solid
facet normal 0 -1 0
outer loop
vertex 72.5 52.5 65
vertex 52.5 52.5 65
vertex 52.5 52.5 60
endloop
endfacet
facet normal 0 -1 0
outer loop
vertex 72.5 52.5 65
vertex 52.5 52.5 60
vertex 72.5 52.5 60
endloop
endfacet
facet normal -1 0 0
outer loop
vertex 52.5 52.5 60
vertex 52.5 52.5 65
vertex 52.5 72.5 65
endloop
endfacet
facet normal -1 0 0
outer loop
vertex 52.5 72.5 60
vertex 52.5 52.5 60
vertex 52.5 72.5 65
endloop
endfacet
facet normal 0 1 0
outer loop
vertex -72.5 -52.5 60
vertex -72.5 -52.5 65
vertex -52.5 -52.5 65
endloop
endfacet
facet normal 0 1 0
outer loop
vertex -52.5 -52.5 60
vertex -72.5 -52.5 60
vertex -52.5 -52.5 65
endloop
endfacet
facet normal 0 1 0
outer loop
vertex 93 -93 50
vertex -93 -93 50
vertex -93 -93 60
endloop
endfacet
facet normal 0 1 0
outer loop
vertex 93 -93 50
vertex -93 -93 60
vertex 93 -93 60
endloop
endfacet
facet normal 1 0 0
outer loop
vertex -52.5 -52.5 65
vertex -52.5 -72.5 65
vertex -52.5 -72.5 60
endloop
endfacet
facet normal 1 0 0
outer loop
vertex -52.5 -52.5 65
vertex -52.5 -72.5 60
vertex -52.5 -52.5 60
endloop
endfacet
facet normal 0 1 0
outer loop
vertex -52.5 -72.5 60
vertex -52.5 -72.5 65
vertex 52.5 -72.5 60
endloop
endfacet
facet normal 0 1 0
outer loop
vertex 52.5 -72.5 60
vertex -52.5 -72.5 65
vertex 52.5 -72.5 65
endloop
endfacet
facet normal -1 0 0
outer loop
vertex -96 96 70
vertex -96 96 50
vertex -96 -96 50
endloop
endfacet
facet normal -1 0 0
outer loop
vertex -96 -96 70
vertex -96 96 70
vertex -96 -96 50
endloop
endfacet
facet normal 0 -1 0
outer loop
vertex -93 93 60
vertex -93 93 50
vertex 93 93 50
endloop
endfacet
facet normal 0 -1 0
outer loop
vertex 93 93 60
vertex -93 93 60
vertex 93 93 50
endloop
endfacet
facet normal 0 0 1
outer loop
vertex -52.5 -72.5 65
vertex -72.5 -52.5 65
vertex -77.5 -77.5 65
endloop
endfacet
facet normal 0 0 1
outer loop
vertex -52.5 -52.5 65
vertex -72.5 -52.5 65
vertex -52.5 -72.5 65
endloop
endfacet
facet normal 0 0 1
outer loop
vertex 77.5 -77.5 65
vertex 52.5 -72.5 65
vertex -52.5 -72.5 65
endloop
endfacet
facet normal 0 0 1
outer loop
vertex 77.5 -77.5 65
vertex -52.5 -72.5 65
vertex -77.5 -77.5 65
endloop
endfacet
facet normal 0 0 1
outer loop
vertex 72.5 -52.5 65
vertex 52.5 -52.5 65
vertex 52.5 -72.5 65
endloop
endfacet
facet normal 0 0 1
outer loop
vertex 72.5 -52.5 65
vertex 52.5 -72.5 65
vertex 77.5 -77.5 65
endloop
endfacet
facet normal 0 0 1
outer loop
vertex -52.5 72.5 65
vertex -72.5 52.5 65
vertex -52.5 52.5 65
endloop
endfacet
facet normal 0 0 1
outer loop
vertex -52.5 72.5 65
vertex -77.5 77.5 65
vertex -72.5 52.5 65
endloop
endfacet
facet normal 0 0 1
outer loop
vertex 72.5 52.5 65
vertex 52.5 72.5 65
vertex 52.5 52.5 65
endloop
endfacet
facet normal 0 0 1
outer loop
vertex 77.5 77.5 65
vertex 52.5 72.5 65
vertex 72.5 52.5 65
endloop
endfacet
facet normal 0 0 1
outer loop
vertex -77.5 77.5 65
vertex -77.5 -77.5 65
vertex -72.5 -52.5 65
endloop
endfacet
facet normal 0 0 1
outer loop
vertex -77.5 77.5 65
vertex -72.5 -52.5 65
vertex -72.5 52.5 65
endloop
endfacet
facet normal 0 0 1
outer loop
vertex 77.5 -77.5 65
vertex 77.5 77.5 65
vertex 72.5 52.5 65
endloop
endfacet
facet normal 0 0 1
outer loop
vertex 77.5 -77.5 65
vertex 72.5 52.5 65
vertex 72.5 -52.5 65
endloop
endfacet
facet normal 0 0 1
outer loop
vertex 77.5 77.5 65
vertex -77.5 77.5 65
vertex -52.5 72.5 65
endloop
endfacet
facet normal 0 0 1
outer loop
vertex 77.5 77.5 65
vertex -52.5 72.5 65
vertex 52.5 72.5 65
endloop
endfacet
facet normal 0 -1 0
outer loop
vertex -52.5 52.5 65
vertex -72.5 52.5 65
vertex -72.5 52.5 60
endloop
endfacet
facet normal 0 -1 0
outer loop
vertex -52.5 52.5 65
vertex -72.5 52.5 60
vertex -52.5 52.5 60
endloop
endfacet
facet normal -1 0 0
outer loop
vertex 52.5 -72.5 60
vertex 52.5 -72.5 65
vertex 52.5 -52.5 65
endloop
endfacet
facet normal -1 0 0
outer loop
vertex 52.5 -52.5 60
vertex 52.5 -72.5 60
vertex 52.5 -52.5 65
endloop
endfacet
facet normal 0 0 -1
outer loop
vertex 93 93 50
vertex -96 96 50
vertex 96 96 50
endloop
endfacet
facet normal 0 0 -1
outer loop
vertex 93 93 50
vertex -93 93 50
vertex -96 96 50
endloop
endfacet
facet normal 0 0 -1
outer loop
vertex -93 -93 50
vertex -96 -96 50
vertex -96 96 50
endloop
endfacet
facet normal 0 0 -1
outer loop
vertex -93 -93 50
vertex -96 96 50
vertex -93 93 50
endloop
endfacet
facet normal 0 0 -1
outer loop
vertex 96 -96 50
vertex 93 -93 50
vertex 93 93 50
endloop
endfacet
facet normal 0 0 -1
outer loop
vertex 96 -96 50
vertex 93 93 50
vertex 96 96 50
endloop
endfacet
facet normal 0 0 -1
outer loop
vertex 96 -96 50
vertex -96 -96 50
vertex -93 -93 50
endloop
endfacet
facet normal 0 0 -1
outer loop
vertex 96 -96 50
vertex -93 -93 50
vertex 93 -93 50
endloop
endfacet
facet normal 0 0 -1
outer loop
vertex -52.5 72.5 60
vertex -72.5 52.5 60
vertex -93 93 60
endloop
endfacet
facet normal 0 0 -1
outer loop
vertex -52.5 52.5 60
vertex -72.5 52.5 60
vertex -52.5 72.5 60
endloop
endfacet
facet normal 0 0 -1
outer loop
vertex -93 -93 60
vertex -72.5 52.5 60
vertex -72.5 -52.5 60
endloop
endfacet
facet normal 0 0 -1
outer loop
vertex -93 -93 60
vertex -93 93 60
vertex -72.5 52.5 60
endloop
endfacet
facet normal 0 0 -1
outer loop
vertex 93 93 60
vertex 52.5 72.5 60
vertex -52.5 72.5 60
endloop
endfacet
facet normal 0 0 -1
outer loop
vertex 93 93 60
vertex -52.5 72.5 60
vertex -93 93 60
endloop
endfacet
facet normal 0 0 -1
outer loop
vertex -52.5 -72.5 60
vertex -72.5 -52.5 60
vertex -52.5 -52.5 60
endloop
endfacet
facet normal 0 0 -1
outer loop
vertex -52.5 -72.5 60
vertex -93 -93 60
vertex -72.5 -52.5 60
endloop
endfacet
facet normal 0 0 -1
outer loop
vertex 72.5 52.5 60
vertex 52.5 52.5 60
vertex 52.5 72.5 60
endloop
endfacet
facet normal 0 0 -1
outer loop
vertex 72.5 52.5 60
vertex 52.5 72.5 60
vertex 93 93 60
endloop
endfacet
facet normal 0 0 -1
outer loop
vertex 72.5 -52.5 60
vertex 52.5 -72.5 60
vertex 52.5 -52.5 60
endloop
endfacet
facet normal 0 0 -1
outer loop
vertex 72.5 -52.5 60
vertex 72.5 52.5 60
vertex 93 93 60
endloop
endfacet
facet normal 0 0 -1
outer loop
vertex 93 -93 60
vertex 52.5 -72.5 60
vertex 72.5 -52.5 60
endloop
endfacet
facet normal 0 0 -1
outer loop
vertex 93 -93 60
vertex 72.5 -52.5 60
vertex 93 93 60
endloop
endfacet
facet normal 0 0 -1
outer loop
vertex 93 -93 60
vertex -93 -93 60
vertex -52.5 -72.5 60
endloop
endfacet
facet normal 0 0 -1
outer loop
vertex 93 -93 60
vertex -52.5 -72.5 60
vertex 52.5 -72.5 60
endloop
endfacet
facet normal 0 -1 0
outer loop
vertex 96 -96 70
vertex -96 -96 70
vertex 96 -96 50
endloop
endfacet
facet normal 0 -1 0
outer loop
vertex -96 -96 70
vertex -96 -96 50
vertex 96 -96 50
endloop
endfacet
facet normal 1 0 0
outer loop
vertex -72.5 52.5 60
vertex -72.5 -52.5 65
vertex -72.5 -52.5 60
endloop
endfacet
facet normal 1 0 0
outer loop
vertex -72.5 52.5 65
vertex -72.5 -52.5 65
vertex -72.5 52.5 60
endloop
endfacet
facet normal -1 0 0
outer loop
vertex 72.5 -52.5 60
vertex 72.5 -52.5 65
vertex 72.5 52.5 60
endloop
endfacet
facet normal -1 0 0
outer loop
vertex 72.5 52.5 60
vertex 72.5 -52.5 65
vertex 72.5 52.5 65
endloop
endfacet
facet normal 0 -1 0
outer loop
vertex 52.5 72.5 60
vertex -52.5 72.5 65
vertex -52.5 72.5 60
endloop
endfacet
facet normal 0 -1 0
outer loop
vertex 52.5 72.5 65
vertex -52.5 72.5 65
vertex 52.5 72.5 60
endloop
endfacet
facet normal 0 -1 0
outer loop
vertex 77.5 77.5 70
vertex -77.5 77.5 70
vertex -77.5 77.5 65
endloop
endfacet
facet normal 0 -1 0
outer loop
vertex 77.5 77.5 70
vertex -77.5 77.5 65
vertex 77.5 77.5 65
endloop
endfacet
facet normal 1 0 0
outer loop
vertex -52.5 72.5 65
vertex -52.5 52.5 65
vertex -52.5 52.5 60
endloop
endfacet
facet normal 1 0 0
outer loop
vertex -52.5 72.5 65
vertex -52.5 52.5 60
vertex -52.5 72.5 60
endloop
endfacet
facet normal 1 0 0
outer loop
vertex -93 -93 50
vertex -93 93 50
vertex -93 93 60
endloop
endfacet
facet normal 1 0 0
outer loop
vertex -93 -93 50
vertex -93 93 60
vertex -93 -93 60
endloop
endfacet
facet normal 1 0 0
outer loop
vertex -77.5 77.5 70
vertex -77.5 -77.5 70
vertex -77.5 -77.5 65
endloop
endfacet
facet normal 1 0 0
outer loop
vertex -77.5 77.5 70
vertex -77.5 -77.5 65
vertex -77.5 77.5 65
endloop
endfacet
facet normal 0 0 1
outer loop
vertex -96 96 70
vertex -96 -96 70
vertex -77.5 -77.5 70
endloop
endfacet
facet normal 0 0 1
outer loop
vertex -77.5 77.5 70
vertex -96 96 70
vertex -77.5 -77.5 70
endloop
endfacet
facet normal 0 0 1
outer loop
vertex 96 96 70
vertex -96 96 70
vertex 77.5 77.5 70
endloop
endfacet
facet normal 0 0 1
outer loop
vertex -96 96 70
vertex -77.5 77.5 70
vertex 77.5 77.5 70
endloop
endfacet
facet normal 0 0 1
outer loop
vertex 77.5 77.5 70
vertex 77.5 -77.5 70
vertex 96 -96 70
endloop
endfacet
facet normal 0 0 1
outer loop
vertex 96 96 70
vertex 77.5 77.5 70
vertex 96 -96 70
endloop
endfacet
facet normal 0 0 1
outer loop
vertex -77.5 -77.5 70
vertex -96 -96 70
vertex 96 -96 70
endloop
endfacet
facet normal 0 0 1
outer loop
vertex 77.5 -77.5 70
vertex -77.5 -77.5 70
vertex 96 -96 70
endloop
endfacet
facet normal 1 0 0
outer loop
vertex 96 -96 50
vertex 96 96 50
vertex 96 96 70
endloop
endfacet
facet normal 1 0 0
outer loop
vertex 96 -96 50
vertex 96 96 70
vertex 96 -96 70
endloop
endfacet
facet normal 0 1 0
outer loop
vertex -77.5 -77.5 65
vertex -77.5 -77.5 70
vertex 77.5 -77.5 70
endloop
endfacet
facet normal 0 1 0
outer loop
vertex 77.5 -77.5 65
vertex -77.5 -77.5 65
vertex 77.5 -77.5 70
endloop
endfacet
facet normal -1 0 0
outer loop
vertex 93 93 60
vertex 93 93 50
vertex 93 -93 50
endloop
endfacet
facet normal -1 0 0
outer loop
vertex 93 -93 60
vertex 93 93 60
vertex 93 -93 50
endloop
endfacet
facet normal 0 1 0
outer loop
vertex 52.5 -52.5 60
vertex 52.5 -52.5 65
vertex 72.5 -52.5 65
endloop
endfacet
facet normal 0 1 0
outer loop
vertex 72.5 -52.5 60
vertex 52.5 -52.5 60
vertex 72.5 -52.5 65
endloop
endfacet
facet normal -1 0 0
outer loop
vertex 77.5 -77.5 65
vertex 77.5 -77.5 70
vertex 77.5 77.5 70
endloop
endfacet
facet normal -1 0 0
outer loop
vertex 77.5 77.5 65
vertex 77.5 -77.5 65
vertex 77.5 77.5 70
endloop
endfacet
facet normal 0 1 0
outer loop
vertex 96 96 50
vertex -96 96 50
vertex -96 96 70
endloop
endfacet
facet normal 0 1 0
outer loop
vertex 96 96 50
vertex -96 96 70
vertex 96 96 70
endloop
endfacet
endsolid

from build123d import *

# Parameters (mm, degrees)
F0_W           = 180
F0_H           = 180
F1_DEPTH       = 70
F2_T           = -5
F3_W           = 170
F3_H           = 170
F4_DEPTH       = 10
F5_W           = 155
F5_H           = 155
F6_DEPTH       = 5
F7_W           = 145
F7_H           = 145
F8_DEPTH       = 25
F9_W           = 20
F9_H           = 20
F10_DEPTH      = 5
F11_W          = 236.9226813316
F11_H          = 264.4580230117
F11_W_2        = 180
F11_H_2        = 180
F12_DEPTH      = 25
F13_W          = 243.9718917012
F13_H          = 319.6009546518
F13_W_2        = 180
F13_H_2        = 180
F14_DEPTH      = 55
F14_DEPTH_BACK = 25
F15_W          = 192
F15_H          = 192
F15_W_2        = 180
F15_H_2        = 180
F16_DEPTH      = 10
F16_DEPTH_BACK = 10
F17_DEPTH      = 5
F18_W          = 186
F18_H          = 186
F18_W_2        = 180
F18_H_2        = 180
F19_DEPTH      = 10


with BuildPart() as f1:
    # F0 (on Top) → F1 (new body)
    with BuildSketch(Plane.XY):
        Rectangle(F0_W, F0_H)
    extrude(amount=F1_DEPTH)

    # F2
    f2_openings = [f1.faces().sort_by_distance(p)[0] for p in [
        (0, 0, 70),
    ]]
    offset(amount=F2_T, openings=f2_openings)

    # F3 (on face) → F4 (join)
    with BuildSketch(Plane.XY.offset(70)):
        Rectangle(F3_W, F3_H)
    extrude(amount=-F4_DEPTH)

    # F5 (on face) → F6 (cut)
    with BuildSketch(Plane.XY.offset(70)):
        Rectangle(F5_W, F5_H)
    extrude(amount=-F6_DEPTH, mode=Mode.SUBTRACT)

    # F7 (on face) → F8 (cut)
    with BuildSketch(Plane.XY.offset(65)):
        Rectangle(F7_W, F7_H)
    extrude(amount=-F8_DEPTH, mode=Mode.SUBTRACT)

    # F9 (on face) → F10 (join)
    with BuildSketch(Plane.XY.offset(65)):
        with Locations((-62.5, 62.5)):
            Rectangle(F9_W, F9_H)
        with Locations((62.5, 62.5)):
            Rectangle(F9_W, F9_H)
        with Locations((62.5, -62.5)):
            Rectangle(F9_W, F9_H)
        with Locations((-62.5, -62.5)):
            Rectangle(F9_W, F9_H)
    extrude(amount=-F10_DEPTH)

    # F11 (on face) → F12 (cut)
    with BuildSketch(Plane(origin=(0, 0, 0), x_dir=(1, 0, 0), z_dir=(0, 0, -1))):
        with Locations((12.1972411871, 16.292501241)):
            Rectangle(F11_W, F11_H)
        Rectangle(F11_W_2, F11_H_2, mode=Mode.SUBTRACT)
    extrude(amount=-F12_DEPTH, mode=Mode.SUBTRACT)

    # F13 (on face) → F14 (cut, two sides)
    with BuildSketch(Plane(origin=(0, 0, 0), x_dir=(1, 0, 0), z_dir=(0, 0, -1))) as f14_sk:
        with Locations((-22.6087830961, -21.1053714156)):
            Rectangle(F13_W, F13_H)
        Rectangle(F13_W_2, F13_H_2, mode=Mode.SUBTRACT)
        Rectangle(F13_W_2, F13_H_2)
    extrude(amount=-F14_DEPTH, mode=Mode.SUBTRACT)
    extrude(f14_sk.sketch, amount=F14_DEPTH_BACK, mode=Mode.SUBTRACT)

    # F15 (on face) → F16 (join, two sides)
    with BuildSketch(Plane(origin=(0, 0, 60), x_dir=(1, 0, 0), z_dir=(0, 0, -1))) as f16_sk:
        Rectangle(F15_W, F15_H)
        Rectangle(F15_W_2, F15_H_2, mode=Mode.SUBTRACT)
    extrude(amount=F16_DEPTH)
    extrude(f16_sk.sketch, amount=-F16_DEPTH_BACK)

    # F17 (cut, through all): a face of the model
    f17_faces = [f1.faces().sort_by_distance(p)[0] for p in [
        (87.4544155877, 0, 55),
    ]]
    extrude(f17_faces, amount=-F17_DEPTH, mode=Mode.SUBTRACT)

    # F18 (on face) → F19 (cut, through all)
    with BuildSketch(Plane(origin=(0, 0, 50), x_dir=(1, 0, 0), z_dir=(0, 0, -1))):
        Rectangle(F18_W, F18_H)
        Rectangle(F18_W_2, F18_H_2, mode=Mode.SUBTRACT)
        Rectangle(F18_W_2, F18_H_2)
    extrude(amount=-F19_DEPTH, mode=Mode.SUBTRACT)


solid = f1.part
